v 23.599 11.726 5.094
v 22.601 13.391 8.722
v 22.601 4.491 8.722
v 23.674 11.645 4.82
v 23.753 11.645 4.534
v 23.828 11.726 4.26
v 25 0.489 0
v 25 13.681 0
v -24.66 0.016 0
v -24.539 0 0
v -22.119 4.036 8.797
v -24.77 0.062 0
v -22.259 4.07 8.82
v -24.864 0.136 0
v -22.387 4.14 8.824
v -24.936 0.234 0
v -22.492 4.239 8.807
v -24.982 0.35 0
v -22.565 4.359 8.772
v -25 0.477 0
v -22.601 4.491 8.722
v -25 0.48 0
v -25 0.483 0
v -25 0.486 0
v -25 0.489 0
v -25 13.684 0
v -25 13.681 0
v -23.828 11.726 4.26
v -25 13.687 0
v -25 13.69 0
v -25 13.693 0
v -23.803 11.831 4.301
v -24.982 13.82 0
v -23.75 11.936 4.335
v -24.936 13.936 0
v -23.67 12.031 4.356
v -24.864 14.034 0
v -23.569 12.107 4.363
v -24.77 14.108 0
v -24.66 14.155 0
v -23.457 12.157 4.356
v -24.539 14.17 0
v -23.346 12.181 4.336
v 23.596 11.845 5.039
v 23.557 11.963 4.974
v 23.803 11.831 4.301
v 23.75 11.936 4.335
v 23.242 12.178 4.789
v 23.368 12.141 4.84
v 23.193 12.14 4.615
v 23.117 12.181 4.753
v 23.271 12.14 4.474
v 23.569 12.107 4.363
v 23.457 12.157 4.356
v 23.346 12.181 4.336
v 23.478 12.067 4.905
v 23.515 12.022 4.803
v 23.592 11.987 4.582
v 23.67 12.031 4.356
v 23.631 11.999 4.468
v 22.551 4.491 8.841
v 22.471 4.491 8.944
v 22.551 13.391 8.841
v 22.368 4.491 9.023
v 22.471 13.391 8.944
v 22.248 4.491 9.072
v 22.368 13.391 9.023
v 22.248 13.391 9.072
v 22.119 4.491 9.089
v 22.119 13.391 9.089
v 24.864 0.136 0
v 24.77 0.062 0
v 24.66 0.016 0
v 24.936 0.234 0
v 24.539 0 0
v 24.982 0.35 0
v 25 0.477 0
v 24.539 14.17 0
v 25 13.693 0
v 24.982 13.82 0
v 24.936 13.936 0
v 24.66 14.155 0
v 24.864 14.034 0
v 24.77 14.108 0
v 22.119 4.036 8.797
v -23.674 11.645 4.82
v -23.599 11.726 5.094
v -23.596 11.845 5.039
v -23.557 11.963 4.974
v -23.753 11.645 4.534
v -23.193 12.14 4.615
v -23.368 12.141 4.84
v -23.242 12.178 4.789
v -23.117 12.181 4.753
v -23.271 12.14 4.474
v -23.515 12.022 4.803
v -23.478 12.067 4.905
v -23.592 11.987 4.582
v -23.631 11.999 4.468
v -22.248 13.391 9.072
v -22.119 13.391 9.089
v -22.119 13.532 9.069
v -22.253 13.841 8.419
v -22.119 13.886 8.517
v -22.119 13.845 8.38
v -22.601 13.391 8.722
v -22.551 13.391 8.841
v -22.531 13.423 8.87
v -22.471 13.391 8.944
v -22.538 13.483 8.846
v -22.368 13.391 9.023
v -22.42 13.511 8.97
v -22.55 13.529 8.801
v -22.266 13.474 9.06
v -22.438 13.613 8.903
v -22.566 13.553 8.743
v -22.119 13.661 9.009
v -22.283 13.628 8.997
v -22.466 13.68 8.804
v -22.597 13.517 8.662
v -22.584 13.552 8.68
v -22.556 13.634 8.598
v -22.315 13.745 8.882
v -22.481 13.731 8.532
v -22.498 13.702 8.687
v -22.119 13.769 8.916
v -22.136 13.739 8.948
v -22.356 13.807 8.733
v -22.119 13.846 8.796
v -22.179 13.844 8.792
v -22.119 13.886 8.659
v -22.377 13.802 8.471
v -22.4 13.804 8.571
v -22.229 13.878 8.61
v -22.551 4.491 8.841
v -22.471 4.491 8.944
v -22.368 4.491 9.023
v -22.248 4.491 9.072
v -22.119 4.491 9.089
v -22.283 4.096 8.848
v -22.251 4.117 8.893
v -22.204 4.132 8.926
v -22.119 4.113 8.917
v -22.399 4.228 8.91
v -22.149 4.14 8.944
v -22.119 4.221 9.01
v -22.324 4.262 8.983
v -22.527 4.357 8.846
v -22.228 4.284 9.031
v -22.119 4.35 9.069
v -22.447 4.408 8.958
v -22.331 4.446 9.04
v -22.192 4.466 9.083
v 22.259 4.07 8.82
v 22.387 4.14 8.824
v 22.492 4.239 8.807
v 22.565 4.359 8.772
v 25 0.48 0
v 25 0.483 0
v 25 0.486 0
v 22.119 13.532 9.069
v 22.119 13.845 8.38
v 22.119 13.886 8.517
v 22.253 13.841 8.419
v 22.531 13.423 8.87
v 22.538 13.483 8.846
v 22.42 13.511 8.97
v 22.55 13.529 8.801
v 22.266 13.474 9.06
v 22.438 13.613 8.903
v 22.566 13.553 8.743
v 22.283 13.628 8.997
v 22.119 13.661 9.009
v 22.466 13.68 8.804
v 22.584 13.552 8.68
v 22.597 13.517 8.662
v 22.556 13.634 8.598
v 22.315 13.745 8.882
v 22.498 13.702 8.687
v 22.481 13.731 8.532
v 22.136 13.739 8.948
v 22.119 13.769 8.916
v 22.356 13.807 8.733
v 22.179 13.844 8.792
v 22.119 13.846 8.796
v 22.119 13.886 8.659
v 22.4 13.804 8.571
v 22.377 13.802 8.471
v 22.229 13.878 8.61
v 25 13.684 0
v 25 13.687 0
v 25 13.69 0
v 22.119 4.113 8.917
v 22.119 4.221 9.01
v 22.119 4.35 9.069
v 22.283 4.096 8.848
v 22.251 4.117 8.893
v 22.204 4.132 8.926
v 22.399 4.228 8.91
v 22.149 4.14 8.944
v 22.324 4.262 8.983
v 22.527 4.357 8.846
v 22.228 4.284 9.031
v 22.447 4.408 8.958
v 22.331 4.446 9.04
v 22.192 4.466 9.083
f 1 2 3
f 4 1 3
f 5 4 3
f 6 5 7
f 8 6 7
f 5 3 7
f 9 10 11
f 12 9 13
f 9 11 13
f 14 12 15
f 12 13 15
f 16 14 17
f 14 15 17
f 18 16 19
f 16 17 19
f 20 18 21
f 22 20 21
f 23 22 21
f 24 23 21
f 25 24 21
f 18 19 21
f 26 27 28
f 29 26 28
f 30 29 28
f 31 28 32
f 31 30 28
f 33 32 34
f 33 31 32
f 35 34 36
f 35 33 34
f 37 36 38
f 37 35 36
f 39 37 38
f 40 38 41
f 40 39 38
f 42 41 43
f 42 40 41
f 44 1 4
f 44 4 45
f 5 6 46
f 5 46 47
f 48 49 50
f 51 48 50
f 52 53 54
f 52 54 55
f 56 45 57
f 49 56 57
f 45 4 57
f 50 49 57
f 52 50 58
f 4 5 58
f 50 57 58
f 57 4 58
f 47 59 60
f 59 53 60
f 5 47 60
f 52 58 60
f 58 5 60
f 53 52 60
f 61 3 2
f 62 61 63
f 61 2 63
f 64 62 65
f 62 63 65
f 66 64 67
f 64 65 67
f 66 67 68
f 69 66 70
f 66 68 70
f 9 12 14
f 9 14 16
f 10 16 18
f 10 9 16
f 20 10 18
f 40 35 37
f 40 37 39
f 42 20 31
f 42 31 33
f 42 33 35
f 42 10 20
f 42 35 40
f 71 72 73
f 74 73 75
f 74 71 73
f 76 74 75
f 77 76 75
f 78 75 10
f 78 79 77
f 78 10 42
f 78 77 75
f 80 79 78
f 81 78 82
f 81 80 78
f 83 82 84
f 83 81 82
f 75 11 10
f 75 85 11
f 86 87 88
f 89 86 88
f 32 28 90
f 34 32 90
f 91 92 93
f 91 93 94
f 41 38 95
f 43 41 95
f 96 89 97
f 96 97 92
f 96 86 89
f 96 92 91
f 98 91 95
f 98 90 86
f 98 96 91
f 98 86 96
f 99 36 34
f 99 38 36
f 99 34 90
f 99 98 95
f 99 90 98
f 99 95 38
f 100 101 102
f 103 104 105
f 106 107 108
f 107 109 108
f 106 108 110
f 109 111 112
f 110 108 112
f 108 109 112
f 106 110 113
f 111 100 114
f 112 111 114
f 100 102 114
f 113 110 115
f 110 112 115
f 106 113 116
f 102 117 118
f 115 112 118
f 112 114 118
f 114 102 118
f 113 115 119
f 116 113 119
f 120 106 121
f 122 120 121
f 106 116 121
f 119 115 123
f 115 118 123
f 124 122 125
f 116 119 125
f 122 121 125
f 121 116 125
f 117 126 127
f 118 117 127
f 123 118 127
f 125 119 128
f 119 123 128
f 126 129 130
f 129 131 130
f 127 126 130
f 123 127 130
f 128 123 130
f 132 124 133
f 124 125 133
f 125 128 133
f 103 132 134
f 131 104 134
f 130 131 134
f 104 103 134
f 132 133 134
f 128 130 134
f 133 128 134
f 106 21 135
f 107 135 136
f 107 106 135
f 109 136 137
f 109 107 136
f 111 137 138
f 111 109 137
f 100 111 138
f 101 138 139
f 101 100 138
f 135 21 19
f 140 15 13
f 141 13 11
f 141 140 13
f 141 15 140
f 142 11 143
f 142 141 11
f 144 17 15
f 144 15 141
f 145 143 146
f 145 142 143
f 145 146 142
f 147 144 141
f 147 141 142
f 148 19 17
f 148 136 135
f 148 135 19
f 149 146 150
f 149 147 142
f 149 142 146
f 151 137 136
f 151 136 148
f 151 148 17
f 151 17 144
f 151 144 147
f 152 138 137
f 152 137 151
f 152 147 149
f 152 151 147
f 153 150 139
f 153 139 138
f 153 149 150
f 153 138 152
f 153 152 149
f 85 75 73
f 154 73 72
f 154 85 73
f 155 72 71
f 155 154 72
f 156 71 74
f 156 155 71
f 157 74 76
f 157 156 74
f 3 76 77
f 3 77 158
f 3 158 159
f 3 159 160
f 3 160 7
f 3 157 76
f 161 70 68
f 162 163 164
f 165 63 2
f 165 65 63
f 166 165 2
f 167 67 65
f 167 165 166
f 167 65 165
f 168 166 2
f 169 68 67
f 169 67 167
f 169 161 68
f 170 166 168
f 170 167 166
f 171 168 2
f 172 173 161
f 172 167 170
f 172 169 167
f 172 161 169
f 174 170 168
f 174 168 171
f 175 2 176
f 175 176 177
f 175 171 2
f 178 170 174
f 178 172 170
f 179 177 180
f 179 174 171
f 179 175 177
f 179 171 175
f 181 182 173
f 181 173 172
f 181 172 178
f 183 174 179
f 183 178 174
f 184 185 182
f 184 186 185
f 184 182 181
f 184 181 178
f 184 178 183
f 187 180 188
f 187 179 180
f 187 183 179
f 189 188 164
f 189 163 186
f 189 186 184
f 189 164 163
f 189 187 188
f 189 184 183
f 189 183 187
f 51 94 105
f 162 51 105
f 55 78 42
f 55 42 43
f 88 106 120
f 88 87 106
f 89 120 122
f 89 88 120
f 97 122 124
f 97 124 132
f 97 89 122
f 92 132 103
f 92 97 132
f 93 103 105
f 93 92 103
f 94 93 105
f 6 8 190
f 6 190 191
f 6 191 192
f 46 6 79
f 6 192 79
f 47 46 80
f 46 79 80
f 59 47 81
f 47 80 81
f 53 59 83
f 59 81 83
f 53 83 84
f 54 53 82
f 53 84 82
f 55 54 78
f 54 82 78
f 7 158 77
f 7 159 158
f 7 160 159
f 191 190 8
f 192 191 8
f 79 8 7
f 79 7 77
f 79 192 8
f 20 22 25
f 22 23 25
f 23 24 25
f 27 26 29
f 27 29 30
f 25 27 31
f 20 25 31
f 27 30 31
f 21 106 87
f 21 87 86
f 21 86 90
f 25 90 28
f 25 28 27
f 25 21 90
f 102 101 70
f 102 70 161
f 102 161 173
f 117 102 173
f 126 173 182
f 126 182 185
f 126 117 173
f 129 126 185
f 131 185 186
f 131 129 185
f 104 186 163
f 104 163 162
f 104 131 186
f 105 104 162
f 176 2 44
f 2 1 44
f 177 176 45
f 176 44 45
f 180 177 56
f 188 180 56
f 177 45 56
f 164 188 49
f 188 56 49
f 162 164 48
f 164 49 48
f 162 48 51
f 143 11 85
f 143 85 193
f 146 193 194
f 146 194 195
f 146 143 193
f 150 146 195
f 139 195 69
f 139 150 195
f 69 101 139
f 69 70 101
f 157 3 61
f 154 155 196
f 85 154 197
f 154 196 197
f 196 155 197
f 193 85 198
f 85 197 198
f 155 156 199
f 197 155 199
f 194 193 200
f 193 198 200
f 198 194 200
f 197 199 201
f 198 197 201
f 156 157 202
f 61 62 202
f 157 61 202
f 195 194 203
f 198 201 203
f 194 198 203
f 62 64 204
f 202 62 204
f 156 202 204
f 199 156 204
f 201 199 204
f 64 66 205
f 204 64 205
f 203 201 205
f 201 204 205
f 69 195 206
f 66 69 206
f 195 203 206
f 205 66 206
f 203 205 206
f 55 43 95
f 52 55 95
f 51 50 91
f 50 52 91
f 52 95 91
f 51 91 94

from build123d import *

# Parameters (mm, degrees)
F1_DEPTH = 25
F3_DEPTH = 14.1712295243
F4_R     = 0.5


with BuildPart() as f1:
    # F0 (on Right) → F1 (new body)
    with BuildSketch(Plane.YZ):
        Polygon((4.1702295243, 9.0889595507), (0, 0), (14.1702295243, 0), (12.0851147622, 4.5444797754), (14.1702295243, 9.0889595507), align=None)
    extrude(amount=F1_DEPTH)

    # F2 (on Front) → F3 (cut, through all)
    with BuildSketch(Plane.XZ):
        Polygon((22.5001233071, 9.0889595507), (25.0001233071, 0), (25.0001233071, 9.0889595507), align=None)
    extrude(amount=-F3_DEPTH, mode=Mode.SUBTRACT)

    # F4
    f4_edges = [f1.edges().sort_by_distance(p)[0] for p in [
        (11.250062, 14.17023, 9.08896),
        (11.875062, 12.085115, 4.54448),
        (22.500123, 9.17023, 9.08896),
        (23.125123, 13.127672, 6.81672),
        (23.750062, 2.085218, 4.544704),
        (11.250062, 4.17023, 9.08896),
        (24.375062, 13.127569, 2.272464),
    ]]
    fillet(f4_edges, radius=F4_R)

    # F5: F1 across face


with BuildPart() as f1_1:
    add(f1.part)
    add(f1.part.mirror(Plane(origin=(0, 7.5492536206, 4.2511231401), x_dir=(0, 1, 0), z_dir=(-1, 0, 0))))


solid = f1_1.part
